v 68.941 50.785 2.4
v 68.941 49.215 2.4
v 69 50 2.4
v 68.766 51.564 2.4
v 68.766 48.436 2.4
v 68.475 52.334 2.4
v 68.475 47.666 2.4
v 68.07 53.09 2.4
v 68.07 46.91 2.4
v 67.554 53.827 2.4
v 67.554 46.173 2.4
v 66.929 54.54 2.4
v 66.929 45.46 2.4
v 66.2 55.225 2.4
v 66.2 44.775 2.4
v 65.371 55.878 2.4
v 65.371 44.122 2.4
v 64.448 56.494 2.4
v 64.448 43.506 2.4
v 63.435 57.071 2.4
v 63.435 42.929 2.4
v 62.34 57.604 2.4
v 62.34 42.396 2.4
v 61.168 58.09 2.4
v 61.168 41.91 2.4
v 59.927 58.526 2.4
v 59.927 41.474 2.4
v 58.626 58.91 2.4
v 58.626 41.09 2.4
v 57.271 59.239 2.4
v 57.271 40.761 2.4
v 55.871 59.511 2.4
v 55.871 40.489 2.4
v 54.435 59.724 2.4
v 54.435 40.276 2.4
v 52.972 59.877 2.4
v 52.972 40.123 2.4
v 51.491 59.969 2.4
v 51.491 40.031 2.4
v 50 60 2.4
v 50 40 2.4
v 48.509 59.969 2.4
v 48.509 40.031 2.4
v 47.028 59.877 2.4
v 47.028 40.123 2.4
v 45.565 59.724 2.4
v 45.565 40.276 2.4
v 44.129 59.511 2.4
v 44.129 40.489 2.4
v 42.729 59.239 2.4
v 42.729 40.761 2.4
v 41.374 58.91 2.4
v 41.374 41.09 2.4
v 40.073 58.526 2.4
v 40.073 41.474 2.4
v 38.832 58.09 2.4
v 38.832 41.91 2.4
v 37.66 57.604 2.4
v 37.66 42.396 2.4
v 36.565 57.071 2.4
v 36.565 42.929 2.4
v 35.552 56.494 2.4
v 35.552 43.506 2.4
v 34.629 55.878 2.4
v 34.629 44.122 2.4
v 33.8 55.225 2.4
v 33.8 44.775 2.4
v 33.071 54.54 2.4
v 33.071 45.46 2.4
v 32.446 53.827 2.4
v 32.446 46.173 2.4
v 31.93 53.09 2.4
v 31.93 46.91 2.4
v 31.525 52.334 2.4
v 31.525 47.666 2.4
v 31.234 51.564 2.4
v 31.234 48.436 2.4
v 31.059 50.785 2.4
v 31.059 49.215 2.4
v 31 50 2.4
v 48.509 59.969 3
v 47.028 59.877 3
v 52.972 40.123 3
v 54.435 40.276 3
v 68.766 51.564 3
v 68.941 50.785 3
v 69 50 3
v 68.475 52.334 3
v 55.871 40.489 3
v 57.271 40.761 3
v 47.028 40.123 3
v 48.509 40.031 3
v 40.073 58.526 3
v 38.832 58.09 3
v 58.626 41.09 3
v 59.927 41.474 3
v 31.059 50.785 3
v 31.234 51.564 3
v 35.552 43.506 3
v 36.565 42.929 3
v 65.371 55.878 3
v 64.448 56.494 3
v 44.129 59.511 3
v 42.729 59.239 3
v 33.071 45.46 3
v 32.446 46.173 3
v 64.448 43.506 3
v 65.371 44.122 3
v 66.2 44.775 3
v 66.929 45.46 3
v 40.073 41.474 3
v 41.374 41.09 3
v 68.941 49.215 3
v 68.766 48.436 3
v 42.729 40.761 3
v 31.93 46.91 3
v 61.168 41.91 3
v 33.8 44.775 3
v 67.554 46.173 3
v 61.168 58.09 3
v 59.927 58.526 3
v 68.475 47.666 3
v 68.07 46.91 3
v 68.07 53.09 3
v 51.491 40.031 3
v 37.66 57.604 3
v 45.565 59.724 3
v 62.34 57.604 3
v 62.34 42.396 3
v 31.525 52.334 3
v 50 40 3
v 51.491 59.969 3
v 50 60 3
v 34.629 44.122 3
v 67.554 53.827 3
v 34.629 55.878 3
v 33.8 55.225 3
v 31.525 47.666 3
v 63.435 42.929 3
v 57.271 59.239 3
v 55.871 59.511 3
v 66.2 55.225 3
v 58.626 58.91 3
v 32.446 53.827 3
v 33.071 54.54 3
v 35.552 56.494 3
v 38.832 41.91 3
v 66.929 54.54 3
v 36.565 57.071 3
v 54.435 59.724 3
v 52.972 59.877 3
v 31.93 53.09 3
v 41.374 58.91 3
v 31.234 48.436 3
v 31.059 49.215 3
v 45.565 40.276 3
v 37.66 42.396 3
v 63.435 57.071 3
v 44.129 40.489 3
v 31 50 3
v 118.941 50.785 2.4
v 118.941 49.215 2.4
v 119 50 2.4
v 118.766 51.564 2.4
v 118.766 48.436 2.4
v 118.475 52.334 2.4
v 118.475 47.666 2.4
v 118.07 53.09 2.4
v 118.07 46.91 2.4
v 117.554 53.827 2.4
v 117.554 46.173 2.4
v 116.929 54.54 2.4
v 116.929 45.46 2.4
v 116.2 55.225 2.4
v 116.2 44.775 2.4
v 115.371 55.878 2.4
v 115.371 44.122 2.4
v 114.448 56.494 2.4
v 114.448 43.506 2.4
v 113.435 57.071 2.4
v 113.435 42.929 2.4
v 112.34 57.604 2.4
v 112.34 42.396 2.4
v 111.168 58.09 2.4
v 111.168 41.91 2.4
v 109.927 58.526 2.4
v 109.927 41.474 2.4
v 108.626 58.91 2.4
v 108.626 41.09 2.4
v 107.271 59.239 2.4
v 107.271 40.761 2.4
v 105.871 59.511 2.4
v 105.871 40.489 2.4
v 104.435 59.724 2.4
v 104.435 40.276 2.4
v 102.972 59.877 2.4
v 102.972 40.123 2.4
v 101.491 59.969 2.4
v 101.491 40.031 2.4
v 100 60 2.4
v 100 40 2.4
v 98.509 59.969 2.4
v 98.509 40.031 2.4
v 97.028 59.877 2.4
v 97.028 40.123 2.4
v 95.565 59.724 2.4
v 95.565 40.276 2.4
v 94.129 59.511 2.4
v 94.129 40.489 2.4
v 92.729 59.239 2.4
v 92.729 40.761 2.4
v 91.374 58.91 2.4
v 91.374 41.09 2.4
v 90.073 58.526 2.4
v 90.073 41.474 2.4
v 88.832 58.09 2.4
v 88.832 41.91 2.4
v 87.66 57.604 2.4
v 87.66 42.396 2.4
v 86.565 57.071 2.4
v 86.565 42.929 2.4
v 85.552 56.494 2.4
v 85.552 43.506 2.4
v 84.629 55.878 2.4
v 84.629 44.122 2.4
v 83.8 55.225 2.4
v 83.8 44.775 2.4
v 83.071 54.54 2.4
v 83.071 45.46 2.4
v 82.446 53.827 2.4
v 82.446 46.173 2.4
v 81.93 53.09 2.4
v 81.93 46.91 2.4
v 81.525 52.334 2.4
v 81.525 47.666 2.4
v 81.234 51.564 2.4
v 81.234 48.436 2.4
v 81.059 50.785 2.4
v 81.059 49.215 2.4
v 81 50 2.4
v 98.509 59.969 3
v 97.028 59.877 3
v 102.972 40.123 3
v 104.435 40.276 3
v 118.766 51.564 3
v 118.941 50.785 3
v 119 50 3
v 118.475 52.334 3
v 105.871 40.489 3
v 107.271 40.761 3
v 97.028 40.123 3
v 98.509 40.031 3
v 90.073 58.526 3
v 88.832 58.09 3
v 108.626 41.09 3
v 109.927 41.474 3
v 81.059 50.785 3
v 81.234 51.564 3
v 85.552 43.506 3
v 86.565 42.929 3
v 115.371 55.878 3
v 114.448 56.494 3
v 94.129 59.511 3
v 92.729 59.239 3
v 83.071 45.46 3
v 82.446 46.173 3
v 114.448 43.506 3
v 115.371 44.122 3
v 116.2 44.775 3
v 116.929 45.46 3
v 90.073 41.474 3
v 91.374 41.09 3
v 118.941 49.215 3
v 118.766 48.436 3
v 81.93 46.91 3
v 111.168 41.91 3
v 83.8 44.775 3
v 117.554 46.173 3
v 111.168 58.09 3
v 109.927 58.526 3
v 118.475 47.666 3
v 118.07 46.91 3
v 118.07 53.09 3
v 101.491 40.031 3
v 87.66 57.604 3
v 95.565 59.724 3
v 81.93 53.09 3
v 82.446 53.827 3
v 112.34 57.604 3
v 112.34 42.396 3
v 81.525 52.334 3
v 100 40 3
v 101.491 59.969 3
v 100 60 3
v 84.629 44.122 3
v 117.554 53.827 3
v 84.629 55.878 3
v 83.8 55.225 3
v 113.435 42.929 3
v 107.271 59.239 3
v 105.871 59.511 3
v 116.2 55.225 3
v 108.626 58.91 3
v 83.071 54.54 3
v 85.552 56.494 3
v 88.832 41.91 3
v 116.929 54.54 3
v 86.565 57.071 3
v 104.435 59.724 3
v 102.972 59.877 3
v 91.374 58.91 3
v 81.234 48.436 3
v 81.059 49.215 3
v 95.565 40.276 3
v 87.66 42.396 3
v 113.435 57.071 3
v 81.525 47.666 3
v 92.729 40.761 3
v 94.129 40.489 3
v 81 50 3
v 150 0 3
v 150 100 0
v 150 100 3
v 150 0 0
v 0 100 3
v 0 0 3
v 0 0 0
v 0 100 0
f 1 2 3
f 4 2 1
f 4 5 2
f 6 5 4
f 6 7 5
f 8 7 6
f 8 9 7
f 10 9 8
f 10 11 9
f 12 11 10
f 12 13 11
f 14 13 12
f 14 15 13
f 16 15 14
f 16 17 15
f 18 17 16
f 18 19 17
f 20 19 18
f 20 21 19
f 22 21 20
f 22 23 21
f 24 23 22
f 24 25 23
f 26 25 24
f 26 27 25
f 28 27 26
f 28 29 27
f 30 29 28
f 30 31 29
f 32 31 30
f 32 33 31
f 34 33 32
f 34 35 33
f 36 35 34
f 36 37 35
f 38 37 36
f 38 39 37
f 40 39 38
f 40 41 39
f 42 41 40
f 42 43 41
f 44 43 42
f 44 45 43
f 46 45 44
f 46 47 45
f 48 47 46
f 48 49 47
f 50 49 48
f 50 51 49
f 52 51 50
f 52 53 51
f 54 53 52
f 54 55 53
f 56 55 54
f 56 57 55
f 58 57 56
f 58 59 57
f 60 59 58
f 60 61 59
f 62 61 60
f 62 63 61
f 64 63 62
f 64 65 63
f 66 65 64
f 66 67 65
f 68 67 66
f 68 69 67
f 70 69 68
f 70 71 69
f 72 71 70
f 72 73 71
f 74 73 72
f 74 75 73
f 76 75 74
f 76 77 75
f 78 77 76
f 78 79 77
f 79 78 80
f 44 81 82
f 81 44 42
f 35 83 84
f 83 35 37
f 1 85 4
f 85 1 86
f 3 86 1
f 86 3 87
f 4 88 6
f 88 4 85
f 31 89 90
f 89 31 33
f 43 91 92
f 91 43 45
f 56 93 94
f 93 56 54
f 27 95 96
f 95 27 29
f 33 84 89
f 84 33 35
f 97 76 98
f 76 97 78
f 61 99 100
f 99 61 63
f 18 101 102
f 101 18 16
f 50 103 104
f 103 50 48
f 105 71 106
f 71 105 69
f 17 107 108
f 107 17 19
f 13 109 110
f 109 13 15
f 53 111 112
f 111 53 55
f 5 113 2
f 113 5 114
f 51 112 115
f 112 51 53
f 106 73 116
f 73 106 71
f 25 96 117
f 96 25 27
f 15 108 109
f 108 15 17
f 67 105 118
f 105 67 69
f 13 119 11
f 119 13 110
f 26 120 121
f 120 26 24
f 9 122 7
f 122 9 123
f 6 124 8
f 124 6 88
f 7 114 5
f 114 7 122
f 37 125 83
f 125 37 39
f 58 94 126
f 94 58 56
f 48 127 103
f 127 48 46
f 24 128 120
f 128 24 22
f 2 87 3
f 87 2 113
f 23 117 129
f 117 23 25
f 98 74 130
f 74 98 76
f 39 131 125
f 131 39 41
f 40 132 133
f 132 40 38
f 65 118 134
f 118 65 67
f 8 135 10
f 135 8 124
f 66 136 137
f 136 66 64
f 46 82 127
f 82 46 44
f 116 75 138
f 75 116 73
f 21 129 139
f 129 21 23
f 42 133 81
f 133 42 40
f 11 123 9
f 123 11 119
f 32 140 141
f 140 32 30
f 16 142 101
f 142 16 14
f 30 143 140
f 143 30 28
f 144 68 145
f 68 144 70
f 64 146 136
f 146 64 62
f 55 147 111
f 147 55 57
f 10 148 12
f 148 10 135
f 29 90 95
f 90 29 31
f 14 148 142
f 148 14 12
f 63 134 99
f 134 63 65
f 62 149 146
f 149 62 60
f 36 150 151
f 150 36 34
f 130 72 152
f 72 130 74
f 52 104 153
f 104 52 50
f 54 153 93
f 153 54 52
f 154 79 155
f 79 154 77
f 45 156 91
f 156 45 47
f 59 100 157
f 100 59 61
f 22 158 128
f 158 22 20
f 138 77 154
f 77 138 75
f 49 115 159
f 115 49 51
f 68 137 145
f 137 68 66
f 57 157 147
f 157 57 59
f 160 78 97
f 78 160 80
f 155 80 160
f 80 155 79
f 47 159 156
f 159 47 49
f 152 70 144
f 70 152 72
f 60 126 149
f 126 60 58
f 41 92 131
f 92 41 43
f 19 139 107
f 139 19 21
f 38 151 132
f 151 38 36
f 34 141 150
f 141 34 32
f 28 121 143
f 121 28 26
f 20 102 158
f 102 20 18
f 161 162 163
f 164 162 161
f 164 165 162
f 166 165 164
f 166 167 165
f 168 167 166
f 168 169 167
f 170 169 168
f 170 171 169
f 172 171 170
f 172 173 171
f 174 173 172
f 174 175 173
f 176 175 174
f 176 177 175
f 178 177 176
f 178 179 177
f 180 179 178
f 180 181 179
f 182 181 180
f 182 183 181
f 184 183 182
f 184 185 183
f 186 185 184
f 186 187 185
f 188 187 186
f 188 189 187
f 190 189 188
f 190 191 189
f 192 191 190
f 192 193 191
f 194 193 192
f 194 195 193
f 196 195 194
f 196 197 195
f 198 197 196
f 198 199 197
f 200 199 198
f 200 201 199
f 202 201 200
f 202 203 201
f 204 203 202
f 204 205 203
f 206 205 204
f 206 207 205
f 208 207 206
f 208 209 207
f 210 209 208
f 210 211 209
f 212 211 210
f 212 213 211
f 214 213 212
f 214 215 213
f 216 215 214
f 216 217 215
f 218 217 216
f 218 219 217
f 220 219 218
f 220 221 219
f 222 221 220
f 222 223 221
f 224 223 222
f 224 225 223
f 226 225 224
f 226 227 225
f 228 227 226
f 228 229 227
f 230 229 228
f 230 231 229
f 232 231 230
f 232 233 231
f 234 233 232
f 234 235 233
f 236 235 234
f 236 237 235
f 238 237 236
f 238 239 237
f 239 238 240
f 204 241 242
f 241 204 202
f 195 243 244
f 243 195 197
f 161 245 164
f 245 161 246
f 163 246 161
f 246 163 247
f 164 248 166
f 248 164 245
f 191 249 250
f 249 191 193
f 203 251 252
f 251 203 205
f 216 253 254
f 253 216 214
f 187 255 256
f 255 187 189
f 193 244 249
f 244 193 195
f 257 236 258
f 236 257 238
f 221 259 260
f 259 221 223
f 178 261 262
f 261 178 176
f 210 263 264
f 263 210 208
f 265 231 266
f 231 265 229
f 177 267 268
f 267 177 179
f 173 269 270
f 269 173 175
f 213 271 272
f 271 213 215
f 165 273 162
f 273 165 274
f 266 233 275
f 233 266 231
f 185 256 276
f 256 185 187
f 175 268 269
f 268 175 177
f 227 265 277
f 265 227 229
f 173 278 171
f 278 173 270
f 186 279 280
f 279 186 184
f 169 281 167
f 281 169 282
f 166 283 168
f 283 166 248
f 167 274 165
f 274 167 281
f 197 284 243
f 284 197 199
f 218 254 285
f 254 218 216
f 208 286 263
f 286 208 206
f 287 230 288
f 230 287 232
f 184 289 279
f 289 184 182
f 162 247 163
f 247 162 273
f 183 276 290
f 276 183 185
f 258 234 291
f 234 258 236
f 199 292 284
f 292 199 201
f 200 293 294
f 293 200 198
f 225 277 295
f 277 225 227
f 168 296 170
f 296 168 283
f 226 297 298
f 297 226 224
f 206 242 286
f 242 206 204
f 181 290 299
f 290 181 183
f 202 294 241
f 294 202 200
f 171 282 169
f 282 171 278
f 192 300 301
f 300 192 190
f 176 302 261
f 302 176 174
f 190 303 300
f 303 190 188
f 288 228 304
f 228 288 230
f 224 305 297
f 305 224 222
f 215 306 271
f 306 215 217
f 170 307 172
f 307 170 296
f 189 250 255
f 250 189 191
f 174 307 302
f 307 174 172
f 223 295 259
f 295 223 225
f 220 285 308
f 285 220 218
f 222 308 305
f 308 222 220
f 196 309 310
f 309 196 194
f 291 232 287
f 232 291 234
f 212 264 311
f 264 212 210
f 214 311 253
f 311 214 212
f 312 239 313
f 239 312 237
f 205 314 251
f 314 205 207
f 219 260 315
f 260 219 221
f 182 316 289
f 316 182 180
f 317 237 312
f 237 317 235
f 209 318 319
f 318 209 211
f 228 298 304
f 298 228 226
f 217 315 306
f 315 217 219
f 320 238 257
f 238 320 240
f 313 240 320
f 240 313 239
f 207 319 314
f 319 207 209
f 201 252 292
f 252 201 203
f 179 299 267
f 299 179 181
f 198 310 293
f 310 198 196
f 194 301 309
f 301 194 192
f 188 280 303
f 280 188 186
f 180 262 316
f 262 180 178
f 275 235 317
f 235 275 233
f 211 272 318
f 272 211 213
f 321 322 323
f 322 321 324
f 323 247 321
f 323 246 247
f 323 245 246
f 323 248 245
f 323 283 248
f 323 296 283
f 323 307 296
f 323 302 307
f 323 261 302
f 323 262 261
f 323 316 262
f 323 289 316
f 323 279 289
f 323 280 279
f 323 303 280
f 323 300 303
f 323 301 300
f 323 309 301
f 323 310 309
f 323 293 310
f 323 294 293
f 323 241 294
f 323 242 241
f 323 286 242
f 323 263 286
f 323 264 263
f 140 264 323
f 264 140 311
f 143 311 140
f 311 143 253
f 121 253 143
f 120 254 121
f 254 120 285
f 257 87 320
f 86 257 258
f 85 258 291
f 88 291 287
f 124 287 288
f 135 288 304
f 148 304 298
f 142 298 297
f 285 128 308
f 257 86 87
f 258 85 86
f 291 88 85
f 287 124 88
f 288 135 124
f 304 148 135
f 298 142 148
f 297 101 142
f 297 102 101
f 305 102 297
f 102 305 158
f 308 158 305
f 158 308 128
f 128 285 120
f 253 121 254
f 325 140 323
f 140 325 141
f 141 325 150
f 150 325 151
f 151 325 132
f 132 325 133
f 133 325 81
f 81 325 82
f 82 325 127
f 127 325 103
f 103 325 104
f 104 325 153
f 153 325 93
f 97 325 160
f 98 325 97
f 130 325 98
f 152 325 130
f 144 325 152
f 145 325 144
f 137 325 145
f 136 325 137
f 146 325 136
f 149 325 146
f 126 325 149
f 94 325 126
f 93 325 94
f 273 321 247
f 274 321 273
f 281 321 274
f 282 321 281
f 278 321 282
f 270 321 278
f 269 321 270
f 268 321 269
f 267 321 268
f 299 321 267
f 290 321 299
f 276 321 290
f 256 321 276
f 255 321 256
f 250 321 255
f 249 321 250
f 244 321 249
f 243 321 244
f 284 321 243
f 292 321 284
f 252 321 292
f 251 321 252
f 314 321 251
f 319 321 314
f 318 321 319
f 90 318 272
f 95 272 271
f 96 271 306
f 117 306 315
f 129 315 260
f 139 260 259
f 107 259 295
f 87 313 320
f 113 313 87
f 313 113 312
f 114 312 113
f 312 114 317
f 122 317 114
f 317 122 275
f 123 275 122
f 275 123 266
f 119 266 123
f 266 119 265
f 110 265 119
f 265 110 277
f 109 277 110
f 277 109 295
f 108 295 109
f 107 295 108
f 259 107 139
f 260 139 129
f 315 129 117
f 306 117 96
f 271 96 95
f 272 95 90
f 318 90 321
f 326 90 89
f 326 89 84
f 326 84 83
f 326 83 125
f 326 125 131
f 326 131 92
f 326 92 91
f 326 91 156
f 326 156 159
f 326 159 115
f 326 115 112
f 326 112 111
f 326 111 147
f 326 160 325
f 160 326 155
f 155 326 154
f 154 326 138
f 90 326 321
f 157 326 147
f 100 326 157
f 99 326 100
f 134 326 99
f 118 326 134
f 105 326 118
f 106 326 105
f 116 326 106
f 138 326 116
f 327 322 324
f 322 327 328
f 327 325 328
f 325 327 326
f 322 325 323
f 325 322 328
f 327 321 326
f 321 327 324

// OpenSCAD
/*
Title: Magnetic Field Line Plate
Folder: 18_advanced_electromechanics
Physics Topic: Advanced conceptual magnetism
Difficulty: Advanced
Print Type: FDM, single material
Teaches: Field-line density as a qualitative representation only
Use Case: Classroom manipulative
*/


// --------------------
// Parameters
// --------------------
plate_w = 150;
plate_h = 100;
t = 3;

module field_line_plate(){
    difference(){
        cube([plate_w,plate_h,t]);
        // stylized loop grooves
        for(r=[14:12:44])
            translate([50,50,t-0.6]) scale([r/20,1,1]) cylinder(h=0.8,d=20,$fn=80);
        for(r=[14:12:44])
            translate([100,50,t-0.6]) scale([r/20,1,1]) cylinder(h=0.8,d=20,$fn=80);
    }
}
field_line_plate();
